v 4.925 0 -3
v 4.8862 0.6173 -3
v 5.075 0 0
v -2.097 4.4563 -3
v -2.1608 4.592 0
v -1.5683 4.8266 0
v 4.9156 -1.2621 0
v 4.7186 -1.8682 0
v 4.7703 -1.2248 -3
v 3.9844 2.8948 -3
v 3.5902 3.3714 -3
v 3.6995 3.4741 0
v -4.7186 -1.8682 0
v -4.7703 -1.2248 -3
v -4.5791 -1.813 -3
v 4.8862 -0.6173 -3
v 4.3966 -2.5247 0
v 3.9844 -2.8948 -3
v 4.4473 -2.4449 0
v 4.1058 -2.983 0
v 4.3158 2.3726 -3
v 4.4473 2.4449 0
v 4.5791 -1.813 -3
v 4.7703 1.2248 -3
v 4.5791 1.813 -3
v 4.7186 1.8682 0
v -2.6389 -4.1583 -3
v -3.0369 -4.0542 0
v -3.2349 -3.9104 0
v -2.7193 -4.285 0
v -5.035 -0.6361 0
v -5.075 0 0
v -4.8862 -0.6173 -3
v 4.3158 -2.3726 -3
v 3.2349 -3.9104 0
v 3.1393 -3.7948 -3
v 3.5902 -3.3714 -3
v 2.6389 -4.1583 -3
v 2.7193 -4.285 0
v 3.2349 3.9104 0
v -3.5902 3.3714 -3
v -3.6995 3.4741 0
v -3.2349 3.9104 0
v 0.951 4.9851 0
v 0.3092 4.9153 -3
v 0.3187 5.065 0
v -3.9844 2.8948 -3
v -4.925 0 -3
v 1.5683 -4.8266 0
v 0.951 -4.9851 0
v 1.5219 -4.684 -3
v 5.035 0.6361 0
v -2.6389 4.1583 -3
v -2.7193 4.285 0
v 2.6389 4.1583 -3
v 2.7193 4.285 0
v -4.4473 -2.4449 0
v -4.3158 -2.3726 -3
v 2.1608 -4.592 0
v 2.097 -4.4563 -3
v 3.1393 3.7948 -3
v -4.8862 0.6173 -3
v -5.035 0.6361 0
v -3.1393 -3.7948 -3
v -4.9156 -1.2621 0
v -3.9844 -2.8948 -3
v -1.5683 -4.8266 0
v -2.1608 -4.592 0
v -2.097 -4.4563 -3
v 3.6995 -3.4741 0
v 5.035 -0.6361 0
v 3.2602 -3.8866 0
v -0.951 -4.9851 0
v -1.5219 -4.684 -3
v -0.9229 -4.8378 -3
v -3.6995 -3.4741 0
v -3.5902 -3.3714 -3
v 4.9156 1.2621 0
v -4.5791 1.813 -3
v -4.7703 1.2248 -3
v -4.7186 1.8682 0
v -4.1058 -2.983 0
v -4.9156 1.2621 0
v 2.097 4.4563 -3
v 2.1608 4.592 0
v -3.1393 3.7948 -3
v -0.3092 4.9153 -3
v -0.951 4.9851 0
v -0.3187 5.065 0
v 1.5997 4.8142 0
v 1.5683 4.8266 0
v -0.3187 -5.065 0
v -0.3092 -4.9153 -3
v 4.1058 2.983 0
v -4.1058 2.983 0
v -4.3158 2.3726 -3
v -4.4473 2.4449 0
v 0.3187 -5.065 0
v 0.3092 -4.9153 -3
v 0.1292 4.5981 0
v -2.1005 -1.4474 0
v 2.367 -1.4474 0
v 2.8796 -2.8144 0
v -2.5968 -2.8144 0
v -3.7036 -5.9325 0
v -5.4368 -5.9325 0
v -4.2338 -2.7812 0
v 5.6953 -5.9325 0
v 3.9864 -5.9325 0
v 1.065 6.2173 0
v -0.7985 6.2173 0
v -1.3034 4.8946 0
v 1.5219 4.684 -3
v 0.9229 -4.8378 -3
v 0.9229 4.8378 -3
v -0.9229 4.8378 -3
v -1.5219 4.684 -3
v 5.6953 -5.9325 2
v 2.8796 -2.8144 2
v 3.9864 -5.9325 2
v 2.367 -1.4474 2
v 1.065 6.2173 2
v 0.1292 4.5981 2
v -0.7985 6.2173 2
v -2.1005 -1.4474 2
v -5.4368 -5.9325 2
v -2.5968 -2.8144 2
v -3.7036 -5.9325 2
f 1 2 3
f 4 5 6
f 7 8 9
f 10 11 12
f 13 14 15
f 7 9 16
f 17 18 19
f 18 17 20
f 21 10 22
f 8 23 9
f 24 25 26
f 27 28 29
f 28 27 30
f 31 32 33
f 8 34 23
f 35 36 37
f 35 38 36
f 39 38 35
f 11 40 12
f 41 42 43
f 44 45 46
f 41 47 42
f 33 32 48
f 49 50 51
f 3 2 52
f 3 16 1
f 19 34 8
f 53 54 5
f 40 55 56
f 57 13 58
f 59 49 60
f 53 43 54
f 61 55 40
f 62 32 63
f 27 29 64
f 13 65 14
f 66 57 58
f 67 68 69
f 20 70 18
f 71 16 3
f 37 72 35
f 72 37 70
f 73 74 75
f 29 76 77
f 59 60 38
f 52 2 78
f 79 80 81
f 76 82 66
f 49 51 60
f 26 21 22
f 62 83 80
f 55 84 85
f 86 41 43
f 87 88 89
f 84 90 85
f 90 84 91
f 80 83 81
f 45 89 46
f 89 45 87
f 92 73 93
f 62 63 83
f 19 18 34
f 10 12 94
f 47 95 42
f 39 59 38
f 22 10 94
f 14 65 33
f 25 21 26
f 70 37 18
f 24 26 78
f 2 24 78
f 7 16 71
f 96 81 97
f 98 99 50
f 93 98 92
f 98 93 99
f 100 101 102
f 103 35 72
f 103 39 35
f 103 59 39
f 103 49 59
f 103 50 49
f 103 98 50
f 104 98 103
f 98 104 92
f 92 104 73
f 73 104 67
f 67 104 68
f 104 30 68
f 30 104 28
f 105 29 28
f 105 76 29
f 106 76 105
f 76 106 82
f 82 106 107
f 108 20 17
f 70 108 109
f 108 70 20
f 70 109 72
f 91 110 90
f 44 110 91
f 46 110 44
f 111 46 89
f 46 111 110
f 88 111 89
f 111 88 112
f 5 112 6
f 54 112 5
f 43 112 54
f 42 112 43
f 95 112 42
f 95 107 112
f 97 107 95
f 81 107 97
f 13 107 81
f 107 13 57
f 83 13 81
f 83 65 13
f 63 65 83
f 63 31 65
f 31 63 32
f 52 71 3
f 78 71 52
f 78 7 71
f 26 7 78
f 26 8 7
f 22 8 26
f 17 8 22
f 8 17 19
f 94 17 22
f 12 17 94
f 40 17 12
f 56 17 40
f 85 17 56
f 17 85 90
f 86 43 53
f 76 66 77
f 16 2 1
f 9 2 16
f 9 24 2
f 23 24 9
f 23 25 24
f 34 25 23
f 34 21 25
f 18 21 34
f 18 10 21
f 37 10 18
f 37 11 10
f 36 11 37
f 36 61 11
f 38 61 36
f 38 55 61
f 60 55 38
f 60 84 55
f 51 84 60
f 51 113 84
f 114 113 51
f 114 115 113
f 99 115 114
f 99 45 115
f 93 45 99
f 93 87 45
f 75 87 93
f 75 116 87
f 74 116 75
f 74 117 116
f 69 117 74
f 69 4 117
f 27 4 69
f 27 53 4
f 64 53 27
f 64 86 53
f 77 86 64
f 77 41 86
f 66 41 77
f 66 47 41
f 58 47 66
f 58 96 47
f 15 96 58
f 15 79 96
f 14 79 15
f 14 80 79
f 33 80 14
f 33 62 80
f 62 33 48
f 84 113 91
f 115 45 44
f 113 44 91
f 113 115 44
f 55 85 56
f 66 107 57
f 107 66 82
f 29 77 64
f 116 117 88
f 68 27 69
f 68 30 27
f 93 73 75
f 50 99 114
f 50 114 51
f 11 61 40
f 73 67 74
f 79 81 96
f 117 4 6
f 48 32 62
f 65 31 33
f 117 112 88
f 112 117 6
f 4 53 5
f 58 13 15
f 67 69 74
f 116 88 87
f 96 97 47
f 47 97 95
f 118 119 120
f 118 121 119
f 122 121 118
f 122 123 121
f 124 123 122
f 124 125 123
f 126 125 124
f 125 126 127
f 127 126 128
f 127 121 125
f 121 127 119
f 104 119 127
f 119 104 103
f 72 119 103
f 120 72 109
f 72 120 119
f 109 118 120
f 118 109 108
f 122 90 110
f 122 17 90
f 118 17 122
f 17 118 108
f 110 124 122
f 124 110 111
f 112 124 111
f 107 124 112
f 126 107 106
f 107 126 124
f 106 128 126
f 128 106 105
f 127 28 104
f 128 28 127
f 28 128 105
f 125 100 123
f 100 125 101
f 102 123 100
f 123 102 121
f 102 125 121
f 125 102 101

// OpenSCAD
$fn = 50;

difference() {
	union() {
		translate(v = [0, 0, -3.0]) {
			cylinder(h = 3, r1 = 4.925, r2 = 5.075);
		}
		linear_extrude(height = 2) {
			text(font = "Impact", halign = "center", size = 12, text = "A", valign = "center");
		}
	}
	union();
}
